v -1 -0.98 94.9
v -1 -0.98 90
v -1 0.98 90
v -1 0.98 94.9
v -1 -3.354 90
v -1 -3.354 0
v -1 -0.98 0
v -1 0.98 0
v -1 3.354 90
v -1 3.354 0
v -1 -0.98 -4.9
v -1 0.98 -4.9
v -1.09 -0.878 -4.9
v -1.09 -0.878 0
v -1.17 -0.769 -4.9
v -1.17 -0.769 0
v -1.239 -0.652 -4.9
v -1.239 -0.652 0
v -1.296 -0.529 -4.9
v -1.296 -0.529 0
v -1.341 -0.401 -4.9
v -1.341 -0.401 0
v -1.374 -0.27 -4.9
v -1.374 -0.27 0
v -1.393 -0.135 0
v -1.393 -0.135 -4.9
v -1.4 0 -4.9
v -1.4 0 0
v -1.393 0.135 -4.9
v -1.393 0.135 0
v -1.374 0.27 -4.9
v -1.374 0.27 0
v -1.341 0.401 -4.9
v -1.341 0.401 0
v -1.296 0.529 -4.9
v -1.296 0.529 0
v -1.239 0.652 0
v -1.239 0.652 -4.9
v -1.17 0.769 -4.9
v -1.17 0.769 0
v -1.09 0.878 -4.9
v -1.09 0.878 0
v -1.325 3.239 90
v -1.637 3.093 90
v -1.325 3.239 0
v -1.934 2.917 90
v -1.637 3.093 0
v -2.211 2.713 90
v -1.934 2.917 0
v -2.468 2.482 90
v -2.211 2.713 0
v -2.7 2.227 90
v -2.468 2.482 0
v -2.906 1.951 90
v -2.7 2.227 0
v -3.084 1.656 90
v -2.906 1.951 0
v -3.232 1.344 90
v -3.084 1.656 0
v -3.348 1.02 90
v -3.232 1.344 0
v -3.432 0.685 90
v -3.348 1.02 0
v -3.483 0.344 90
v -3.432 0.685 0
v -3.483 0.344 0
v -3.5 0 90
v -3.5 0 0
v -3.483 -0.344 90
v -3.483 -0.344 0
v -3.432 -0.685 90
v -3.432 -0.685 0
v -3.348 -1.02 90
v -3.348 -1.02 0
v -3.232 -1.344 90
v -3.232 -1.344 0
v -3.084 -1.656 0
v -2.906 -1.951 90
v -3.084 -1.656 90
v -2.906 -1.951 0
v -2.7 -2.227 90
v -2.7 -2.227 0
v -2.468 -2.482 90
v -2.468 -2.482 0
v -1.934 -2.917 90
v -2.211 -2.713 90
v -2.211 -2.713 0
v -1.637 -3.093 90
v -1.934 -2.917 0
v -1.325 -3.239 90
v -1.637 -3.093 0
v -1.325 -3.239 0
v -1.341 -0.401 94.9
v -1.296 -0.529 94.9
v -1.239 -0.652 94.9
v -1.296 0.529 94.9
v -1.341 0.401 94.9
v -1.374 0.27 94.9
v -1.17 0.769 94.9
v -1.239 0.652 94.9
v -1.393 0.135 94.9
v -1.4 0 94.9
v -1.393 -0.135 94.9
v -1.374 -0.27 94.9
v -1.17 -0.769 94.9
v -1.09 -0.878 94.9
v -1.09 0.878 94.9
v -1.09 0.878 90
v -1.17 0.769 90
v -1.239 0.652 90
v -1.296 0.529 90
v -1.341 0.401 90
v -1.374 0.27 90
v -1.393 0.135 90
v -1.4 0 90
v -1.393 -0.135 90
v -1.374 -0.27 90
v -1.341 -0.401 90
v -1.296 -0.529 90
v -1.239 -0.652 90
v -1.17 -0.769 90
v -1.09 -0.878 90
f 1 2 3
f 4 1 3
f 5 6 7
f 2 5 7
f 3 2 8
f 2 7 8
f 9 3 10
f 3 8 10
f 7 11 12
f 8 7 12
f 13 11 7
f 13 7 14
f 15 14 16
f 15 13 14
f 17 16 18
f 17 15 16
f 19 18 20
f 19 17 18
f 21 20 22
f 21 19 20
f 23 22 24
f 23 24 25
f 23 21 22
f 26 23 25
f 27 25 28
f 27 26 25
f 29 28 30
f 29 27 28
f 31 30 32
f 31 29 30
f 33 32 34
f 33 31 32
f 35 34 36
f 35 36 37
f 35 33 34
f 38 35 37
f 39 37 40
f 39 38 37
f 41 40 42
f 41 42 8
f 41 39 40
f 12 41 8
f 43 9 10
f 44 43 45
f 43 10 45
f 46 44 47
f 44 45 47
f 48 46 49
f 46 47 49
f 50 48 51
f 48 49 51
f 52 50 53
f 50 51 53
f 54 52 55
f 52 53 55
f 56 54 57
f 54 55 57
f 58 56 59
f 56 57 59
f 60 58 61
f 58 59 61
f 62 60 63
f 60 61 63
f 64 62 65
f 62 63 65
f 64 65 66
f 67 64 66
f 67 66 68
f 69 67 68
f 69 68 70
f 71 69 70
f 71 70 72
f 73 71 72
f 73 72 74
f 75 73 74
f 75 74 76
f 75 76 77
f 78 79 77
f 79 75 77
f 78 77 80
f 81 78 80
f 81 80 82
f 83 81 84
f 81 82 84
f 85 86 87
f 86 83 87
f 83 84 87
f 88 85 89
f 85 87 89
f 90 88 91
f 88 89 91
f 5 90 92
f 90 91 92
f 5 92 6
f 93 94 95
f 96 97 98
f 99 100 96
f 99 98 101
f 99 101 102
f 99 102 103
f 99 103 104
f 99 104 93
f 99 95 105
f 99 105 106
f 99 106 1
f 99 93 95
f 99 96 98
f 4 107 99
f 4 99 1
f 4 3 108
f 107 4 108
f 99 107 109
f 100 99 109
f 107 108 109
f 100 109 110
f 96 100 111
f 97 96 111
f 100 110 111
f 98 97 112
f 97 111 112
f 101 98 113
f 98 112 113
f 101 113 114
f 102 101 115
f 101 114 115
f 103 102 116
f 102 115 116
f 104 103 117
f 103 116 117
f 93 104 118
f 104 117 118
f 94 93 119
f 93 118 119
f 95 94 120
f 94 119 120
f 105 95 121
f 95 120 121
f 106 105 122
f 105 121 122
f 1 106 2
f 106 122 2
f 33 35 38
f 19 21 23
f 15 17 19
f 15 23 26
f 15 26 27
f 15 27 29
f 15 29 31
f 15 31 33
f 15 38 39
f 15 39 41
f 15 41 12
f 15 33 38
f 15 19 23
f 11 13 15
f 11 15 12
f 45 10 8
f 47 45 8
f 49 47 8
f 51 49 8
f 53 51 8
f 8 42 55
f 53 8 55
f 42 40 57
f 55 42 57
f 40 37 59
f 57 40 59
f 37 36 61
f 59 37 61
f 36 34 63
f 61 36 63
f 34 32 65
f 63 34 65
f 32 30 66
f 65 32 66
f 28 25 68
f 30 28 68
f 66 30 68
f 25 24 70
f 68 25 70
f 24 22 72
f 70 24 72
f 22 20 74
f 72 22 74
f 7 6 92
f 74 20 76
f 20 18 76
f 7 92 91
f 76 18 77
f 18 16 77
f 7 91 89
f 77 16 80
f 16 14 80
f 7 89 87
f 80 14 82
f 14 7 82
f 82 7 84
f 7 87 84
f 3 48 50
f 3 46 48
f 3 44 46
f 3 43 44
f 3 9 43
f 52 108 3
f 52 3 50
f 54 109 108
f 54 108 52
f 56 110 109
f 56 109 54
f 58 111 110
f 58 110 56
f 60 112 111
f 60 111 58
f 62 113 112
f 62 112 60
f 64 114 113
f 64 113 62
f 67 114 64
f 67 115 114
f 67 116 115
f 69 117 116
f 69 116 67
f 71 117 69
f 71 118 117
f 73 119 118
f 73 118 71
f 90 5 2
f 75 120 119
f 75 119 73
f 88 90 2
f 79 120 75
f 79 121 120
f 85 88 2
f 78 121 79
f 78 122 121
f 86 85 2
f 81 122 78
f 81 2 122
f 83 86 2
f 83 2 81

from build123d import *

# Parameters (mm, degrees)
SKIZZE1_R                            = 3.5
AUFSATZ_LINEAR_AUSTRAGEN1_DEPTH      = 90
SKIZZE3_R                            = 1.4
AUFSATZ_LINEAR_AUSTRAGEN2_DEPTH      = 4.9
AUFSATZ_LINEAR_START                 = 4.9
SKIZZE4_R                            = 1.4
AUFSATZ_LINEAR_AUSTRAGEN3_DEPTH      = 4.9
SCHNITT_LINEAR_AUSTRAGEN1_DEPTH      = 96.028995575
SCHNITT_LINEAR_AUSTRAGEN1_DEPTH_BACK = 96.028995575
SKIZZE5_W                            = 2
SKIZZE5_H                            = 8.003816725
SCHNITT_LINEAR_AUSTRAGEN2_DEPTH      = 96.023733877
SCHNITT_LINEAR_AUSTRAGEN2_DEPTH_BACK = 96.023733877
SKIZZE6_W                            = 3.926264937
SKIZZE6_H                            = 7.51599288


with BuildPart() as part:
    # Skizze1 → Aufsatz-Linear austragen1 (new body)
    with BuildSketch(Plane.XY):
        with Locations(Location((0, 0, 0), (0, 0, 180))):
            Circle(SKIZZE1_R)
    extrude(amount=AUFSATZ_LINEAR_AUSTRAGEN1_DEPTH)

    # Skizze3 → Aufsatz-Linear austragen2 (add)
    with BuildSketch(Plane.XY.offset(90)):
        Circle(SKIZZE3_R)
    extrude(amount=AUFSATZ_LINEAR_AUSTRAGEN2_DEPTH)

    # Skizze4 → Aufsatz-Linear austragen3 (add)
    with BuildSketch(Plane(origin=(0, 0, 0), x_dir=(-1, 0, 0), z_dir=(0, 0, -1)).offset(AUFSATZ_LINEAR_START)):
        with Locations(Location((0, 0, 0), (0, 0, 180))):
            Circle(SKIZZE4_R)
    extrude(amount=-AUFSATZ_LINEAR_AUSTRAGEN3_DEPTH)

    # Skizze5 → Schnitt-Linear austragen1 (cut, two sides: drawn at the far end of the back side and taken through both)
    with BuildSketch(Plane.XY.offset(90).offset(-SCHNITT_LINEAR_AUSTRAGEN1_DEPTH_BACK)):
        with Locations((0, -0.133552217)):
            Rectangle(SKIZZE5_W, SKIZZE5_H)
    extrude(amount=SCHNITT_LINEAR_AUSTRAGEN1_DEPTH + SCHNITT_LINEAR_AUSTRAGEN1_DEPTH_BACK, mode=Mode.SUBTRACT)


with BuildPart() as schnitt_linear_austragen1_piece_1:
    # of the separate pieces the step leaves, piece 1, a body of its own (schnitt_linear_austragen1_pieces)
    add(part.part.solids().sort_by_distance((-1, 3.354101966, 0))[0])


with BuildPart() as schnitt_linear_austragen1_piece_2:
    # of the separate pieces the step leaves, piece 2, a body of its own (schnitt_linear_austragen1_pieces)
    add(part.part.solids().sort_by_distance((1, -3.354101966, 0))[0])

    # Skizze6 → Schnitt-Linear austragen2 (cut, two sides: drawn at the far end of the back side and taken through both)
    with BuildSketch(Plane.XY.offset(90).offset(-SCHNITT_LINEAR_AUSTRAGEN2_DEPTH_BACK)):
        with Locations((2.16722224, 0.040063928)):
            Rectangle(SKIZZE6_W, SKIZZE6_H)
    extrude(amount=SCHNITT_LINEAR_AUSTRAGEN2_DEPTH + SCHNITT_LINEAR_AUSTRAGEN2_DEPTH_BACK, mode=Mode.SUBTRACT)


solid = schnitt_linear_austragen1_piece_1.part
